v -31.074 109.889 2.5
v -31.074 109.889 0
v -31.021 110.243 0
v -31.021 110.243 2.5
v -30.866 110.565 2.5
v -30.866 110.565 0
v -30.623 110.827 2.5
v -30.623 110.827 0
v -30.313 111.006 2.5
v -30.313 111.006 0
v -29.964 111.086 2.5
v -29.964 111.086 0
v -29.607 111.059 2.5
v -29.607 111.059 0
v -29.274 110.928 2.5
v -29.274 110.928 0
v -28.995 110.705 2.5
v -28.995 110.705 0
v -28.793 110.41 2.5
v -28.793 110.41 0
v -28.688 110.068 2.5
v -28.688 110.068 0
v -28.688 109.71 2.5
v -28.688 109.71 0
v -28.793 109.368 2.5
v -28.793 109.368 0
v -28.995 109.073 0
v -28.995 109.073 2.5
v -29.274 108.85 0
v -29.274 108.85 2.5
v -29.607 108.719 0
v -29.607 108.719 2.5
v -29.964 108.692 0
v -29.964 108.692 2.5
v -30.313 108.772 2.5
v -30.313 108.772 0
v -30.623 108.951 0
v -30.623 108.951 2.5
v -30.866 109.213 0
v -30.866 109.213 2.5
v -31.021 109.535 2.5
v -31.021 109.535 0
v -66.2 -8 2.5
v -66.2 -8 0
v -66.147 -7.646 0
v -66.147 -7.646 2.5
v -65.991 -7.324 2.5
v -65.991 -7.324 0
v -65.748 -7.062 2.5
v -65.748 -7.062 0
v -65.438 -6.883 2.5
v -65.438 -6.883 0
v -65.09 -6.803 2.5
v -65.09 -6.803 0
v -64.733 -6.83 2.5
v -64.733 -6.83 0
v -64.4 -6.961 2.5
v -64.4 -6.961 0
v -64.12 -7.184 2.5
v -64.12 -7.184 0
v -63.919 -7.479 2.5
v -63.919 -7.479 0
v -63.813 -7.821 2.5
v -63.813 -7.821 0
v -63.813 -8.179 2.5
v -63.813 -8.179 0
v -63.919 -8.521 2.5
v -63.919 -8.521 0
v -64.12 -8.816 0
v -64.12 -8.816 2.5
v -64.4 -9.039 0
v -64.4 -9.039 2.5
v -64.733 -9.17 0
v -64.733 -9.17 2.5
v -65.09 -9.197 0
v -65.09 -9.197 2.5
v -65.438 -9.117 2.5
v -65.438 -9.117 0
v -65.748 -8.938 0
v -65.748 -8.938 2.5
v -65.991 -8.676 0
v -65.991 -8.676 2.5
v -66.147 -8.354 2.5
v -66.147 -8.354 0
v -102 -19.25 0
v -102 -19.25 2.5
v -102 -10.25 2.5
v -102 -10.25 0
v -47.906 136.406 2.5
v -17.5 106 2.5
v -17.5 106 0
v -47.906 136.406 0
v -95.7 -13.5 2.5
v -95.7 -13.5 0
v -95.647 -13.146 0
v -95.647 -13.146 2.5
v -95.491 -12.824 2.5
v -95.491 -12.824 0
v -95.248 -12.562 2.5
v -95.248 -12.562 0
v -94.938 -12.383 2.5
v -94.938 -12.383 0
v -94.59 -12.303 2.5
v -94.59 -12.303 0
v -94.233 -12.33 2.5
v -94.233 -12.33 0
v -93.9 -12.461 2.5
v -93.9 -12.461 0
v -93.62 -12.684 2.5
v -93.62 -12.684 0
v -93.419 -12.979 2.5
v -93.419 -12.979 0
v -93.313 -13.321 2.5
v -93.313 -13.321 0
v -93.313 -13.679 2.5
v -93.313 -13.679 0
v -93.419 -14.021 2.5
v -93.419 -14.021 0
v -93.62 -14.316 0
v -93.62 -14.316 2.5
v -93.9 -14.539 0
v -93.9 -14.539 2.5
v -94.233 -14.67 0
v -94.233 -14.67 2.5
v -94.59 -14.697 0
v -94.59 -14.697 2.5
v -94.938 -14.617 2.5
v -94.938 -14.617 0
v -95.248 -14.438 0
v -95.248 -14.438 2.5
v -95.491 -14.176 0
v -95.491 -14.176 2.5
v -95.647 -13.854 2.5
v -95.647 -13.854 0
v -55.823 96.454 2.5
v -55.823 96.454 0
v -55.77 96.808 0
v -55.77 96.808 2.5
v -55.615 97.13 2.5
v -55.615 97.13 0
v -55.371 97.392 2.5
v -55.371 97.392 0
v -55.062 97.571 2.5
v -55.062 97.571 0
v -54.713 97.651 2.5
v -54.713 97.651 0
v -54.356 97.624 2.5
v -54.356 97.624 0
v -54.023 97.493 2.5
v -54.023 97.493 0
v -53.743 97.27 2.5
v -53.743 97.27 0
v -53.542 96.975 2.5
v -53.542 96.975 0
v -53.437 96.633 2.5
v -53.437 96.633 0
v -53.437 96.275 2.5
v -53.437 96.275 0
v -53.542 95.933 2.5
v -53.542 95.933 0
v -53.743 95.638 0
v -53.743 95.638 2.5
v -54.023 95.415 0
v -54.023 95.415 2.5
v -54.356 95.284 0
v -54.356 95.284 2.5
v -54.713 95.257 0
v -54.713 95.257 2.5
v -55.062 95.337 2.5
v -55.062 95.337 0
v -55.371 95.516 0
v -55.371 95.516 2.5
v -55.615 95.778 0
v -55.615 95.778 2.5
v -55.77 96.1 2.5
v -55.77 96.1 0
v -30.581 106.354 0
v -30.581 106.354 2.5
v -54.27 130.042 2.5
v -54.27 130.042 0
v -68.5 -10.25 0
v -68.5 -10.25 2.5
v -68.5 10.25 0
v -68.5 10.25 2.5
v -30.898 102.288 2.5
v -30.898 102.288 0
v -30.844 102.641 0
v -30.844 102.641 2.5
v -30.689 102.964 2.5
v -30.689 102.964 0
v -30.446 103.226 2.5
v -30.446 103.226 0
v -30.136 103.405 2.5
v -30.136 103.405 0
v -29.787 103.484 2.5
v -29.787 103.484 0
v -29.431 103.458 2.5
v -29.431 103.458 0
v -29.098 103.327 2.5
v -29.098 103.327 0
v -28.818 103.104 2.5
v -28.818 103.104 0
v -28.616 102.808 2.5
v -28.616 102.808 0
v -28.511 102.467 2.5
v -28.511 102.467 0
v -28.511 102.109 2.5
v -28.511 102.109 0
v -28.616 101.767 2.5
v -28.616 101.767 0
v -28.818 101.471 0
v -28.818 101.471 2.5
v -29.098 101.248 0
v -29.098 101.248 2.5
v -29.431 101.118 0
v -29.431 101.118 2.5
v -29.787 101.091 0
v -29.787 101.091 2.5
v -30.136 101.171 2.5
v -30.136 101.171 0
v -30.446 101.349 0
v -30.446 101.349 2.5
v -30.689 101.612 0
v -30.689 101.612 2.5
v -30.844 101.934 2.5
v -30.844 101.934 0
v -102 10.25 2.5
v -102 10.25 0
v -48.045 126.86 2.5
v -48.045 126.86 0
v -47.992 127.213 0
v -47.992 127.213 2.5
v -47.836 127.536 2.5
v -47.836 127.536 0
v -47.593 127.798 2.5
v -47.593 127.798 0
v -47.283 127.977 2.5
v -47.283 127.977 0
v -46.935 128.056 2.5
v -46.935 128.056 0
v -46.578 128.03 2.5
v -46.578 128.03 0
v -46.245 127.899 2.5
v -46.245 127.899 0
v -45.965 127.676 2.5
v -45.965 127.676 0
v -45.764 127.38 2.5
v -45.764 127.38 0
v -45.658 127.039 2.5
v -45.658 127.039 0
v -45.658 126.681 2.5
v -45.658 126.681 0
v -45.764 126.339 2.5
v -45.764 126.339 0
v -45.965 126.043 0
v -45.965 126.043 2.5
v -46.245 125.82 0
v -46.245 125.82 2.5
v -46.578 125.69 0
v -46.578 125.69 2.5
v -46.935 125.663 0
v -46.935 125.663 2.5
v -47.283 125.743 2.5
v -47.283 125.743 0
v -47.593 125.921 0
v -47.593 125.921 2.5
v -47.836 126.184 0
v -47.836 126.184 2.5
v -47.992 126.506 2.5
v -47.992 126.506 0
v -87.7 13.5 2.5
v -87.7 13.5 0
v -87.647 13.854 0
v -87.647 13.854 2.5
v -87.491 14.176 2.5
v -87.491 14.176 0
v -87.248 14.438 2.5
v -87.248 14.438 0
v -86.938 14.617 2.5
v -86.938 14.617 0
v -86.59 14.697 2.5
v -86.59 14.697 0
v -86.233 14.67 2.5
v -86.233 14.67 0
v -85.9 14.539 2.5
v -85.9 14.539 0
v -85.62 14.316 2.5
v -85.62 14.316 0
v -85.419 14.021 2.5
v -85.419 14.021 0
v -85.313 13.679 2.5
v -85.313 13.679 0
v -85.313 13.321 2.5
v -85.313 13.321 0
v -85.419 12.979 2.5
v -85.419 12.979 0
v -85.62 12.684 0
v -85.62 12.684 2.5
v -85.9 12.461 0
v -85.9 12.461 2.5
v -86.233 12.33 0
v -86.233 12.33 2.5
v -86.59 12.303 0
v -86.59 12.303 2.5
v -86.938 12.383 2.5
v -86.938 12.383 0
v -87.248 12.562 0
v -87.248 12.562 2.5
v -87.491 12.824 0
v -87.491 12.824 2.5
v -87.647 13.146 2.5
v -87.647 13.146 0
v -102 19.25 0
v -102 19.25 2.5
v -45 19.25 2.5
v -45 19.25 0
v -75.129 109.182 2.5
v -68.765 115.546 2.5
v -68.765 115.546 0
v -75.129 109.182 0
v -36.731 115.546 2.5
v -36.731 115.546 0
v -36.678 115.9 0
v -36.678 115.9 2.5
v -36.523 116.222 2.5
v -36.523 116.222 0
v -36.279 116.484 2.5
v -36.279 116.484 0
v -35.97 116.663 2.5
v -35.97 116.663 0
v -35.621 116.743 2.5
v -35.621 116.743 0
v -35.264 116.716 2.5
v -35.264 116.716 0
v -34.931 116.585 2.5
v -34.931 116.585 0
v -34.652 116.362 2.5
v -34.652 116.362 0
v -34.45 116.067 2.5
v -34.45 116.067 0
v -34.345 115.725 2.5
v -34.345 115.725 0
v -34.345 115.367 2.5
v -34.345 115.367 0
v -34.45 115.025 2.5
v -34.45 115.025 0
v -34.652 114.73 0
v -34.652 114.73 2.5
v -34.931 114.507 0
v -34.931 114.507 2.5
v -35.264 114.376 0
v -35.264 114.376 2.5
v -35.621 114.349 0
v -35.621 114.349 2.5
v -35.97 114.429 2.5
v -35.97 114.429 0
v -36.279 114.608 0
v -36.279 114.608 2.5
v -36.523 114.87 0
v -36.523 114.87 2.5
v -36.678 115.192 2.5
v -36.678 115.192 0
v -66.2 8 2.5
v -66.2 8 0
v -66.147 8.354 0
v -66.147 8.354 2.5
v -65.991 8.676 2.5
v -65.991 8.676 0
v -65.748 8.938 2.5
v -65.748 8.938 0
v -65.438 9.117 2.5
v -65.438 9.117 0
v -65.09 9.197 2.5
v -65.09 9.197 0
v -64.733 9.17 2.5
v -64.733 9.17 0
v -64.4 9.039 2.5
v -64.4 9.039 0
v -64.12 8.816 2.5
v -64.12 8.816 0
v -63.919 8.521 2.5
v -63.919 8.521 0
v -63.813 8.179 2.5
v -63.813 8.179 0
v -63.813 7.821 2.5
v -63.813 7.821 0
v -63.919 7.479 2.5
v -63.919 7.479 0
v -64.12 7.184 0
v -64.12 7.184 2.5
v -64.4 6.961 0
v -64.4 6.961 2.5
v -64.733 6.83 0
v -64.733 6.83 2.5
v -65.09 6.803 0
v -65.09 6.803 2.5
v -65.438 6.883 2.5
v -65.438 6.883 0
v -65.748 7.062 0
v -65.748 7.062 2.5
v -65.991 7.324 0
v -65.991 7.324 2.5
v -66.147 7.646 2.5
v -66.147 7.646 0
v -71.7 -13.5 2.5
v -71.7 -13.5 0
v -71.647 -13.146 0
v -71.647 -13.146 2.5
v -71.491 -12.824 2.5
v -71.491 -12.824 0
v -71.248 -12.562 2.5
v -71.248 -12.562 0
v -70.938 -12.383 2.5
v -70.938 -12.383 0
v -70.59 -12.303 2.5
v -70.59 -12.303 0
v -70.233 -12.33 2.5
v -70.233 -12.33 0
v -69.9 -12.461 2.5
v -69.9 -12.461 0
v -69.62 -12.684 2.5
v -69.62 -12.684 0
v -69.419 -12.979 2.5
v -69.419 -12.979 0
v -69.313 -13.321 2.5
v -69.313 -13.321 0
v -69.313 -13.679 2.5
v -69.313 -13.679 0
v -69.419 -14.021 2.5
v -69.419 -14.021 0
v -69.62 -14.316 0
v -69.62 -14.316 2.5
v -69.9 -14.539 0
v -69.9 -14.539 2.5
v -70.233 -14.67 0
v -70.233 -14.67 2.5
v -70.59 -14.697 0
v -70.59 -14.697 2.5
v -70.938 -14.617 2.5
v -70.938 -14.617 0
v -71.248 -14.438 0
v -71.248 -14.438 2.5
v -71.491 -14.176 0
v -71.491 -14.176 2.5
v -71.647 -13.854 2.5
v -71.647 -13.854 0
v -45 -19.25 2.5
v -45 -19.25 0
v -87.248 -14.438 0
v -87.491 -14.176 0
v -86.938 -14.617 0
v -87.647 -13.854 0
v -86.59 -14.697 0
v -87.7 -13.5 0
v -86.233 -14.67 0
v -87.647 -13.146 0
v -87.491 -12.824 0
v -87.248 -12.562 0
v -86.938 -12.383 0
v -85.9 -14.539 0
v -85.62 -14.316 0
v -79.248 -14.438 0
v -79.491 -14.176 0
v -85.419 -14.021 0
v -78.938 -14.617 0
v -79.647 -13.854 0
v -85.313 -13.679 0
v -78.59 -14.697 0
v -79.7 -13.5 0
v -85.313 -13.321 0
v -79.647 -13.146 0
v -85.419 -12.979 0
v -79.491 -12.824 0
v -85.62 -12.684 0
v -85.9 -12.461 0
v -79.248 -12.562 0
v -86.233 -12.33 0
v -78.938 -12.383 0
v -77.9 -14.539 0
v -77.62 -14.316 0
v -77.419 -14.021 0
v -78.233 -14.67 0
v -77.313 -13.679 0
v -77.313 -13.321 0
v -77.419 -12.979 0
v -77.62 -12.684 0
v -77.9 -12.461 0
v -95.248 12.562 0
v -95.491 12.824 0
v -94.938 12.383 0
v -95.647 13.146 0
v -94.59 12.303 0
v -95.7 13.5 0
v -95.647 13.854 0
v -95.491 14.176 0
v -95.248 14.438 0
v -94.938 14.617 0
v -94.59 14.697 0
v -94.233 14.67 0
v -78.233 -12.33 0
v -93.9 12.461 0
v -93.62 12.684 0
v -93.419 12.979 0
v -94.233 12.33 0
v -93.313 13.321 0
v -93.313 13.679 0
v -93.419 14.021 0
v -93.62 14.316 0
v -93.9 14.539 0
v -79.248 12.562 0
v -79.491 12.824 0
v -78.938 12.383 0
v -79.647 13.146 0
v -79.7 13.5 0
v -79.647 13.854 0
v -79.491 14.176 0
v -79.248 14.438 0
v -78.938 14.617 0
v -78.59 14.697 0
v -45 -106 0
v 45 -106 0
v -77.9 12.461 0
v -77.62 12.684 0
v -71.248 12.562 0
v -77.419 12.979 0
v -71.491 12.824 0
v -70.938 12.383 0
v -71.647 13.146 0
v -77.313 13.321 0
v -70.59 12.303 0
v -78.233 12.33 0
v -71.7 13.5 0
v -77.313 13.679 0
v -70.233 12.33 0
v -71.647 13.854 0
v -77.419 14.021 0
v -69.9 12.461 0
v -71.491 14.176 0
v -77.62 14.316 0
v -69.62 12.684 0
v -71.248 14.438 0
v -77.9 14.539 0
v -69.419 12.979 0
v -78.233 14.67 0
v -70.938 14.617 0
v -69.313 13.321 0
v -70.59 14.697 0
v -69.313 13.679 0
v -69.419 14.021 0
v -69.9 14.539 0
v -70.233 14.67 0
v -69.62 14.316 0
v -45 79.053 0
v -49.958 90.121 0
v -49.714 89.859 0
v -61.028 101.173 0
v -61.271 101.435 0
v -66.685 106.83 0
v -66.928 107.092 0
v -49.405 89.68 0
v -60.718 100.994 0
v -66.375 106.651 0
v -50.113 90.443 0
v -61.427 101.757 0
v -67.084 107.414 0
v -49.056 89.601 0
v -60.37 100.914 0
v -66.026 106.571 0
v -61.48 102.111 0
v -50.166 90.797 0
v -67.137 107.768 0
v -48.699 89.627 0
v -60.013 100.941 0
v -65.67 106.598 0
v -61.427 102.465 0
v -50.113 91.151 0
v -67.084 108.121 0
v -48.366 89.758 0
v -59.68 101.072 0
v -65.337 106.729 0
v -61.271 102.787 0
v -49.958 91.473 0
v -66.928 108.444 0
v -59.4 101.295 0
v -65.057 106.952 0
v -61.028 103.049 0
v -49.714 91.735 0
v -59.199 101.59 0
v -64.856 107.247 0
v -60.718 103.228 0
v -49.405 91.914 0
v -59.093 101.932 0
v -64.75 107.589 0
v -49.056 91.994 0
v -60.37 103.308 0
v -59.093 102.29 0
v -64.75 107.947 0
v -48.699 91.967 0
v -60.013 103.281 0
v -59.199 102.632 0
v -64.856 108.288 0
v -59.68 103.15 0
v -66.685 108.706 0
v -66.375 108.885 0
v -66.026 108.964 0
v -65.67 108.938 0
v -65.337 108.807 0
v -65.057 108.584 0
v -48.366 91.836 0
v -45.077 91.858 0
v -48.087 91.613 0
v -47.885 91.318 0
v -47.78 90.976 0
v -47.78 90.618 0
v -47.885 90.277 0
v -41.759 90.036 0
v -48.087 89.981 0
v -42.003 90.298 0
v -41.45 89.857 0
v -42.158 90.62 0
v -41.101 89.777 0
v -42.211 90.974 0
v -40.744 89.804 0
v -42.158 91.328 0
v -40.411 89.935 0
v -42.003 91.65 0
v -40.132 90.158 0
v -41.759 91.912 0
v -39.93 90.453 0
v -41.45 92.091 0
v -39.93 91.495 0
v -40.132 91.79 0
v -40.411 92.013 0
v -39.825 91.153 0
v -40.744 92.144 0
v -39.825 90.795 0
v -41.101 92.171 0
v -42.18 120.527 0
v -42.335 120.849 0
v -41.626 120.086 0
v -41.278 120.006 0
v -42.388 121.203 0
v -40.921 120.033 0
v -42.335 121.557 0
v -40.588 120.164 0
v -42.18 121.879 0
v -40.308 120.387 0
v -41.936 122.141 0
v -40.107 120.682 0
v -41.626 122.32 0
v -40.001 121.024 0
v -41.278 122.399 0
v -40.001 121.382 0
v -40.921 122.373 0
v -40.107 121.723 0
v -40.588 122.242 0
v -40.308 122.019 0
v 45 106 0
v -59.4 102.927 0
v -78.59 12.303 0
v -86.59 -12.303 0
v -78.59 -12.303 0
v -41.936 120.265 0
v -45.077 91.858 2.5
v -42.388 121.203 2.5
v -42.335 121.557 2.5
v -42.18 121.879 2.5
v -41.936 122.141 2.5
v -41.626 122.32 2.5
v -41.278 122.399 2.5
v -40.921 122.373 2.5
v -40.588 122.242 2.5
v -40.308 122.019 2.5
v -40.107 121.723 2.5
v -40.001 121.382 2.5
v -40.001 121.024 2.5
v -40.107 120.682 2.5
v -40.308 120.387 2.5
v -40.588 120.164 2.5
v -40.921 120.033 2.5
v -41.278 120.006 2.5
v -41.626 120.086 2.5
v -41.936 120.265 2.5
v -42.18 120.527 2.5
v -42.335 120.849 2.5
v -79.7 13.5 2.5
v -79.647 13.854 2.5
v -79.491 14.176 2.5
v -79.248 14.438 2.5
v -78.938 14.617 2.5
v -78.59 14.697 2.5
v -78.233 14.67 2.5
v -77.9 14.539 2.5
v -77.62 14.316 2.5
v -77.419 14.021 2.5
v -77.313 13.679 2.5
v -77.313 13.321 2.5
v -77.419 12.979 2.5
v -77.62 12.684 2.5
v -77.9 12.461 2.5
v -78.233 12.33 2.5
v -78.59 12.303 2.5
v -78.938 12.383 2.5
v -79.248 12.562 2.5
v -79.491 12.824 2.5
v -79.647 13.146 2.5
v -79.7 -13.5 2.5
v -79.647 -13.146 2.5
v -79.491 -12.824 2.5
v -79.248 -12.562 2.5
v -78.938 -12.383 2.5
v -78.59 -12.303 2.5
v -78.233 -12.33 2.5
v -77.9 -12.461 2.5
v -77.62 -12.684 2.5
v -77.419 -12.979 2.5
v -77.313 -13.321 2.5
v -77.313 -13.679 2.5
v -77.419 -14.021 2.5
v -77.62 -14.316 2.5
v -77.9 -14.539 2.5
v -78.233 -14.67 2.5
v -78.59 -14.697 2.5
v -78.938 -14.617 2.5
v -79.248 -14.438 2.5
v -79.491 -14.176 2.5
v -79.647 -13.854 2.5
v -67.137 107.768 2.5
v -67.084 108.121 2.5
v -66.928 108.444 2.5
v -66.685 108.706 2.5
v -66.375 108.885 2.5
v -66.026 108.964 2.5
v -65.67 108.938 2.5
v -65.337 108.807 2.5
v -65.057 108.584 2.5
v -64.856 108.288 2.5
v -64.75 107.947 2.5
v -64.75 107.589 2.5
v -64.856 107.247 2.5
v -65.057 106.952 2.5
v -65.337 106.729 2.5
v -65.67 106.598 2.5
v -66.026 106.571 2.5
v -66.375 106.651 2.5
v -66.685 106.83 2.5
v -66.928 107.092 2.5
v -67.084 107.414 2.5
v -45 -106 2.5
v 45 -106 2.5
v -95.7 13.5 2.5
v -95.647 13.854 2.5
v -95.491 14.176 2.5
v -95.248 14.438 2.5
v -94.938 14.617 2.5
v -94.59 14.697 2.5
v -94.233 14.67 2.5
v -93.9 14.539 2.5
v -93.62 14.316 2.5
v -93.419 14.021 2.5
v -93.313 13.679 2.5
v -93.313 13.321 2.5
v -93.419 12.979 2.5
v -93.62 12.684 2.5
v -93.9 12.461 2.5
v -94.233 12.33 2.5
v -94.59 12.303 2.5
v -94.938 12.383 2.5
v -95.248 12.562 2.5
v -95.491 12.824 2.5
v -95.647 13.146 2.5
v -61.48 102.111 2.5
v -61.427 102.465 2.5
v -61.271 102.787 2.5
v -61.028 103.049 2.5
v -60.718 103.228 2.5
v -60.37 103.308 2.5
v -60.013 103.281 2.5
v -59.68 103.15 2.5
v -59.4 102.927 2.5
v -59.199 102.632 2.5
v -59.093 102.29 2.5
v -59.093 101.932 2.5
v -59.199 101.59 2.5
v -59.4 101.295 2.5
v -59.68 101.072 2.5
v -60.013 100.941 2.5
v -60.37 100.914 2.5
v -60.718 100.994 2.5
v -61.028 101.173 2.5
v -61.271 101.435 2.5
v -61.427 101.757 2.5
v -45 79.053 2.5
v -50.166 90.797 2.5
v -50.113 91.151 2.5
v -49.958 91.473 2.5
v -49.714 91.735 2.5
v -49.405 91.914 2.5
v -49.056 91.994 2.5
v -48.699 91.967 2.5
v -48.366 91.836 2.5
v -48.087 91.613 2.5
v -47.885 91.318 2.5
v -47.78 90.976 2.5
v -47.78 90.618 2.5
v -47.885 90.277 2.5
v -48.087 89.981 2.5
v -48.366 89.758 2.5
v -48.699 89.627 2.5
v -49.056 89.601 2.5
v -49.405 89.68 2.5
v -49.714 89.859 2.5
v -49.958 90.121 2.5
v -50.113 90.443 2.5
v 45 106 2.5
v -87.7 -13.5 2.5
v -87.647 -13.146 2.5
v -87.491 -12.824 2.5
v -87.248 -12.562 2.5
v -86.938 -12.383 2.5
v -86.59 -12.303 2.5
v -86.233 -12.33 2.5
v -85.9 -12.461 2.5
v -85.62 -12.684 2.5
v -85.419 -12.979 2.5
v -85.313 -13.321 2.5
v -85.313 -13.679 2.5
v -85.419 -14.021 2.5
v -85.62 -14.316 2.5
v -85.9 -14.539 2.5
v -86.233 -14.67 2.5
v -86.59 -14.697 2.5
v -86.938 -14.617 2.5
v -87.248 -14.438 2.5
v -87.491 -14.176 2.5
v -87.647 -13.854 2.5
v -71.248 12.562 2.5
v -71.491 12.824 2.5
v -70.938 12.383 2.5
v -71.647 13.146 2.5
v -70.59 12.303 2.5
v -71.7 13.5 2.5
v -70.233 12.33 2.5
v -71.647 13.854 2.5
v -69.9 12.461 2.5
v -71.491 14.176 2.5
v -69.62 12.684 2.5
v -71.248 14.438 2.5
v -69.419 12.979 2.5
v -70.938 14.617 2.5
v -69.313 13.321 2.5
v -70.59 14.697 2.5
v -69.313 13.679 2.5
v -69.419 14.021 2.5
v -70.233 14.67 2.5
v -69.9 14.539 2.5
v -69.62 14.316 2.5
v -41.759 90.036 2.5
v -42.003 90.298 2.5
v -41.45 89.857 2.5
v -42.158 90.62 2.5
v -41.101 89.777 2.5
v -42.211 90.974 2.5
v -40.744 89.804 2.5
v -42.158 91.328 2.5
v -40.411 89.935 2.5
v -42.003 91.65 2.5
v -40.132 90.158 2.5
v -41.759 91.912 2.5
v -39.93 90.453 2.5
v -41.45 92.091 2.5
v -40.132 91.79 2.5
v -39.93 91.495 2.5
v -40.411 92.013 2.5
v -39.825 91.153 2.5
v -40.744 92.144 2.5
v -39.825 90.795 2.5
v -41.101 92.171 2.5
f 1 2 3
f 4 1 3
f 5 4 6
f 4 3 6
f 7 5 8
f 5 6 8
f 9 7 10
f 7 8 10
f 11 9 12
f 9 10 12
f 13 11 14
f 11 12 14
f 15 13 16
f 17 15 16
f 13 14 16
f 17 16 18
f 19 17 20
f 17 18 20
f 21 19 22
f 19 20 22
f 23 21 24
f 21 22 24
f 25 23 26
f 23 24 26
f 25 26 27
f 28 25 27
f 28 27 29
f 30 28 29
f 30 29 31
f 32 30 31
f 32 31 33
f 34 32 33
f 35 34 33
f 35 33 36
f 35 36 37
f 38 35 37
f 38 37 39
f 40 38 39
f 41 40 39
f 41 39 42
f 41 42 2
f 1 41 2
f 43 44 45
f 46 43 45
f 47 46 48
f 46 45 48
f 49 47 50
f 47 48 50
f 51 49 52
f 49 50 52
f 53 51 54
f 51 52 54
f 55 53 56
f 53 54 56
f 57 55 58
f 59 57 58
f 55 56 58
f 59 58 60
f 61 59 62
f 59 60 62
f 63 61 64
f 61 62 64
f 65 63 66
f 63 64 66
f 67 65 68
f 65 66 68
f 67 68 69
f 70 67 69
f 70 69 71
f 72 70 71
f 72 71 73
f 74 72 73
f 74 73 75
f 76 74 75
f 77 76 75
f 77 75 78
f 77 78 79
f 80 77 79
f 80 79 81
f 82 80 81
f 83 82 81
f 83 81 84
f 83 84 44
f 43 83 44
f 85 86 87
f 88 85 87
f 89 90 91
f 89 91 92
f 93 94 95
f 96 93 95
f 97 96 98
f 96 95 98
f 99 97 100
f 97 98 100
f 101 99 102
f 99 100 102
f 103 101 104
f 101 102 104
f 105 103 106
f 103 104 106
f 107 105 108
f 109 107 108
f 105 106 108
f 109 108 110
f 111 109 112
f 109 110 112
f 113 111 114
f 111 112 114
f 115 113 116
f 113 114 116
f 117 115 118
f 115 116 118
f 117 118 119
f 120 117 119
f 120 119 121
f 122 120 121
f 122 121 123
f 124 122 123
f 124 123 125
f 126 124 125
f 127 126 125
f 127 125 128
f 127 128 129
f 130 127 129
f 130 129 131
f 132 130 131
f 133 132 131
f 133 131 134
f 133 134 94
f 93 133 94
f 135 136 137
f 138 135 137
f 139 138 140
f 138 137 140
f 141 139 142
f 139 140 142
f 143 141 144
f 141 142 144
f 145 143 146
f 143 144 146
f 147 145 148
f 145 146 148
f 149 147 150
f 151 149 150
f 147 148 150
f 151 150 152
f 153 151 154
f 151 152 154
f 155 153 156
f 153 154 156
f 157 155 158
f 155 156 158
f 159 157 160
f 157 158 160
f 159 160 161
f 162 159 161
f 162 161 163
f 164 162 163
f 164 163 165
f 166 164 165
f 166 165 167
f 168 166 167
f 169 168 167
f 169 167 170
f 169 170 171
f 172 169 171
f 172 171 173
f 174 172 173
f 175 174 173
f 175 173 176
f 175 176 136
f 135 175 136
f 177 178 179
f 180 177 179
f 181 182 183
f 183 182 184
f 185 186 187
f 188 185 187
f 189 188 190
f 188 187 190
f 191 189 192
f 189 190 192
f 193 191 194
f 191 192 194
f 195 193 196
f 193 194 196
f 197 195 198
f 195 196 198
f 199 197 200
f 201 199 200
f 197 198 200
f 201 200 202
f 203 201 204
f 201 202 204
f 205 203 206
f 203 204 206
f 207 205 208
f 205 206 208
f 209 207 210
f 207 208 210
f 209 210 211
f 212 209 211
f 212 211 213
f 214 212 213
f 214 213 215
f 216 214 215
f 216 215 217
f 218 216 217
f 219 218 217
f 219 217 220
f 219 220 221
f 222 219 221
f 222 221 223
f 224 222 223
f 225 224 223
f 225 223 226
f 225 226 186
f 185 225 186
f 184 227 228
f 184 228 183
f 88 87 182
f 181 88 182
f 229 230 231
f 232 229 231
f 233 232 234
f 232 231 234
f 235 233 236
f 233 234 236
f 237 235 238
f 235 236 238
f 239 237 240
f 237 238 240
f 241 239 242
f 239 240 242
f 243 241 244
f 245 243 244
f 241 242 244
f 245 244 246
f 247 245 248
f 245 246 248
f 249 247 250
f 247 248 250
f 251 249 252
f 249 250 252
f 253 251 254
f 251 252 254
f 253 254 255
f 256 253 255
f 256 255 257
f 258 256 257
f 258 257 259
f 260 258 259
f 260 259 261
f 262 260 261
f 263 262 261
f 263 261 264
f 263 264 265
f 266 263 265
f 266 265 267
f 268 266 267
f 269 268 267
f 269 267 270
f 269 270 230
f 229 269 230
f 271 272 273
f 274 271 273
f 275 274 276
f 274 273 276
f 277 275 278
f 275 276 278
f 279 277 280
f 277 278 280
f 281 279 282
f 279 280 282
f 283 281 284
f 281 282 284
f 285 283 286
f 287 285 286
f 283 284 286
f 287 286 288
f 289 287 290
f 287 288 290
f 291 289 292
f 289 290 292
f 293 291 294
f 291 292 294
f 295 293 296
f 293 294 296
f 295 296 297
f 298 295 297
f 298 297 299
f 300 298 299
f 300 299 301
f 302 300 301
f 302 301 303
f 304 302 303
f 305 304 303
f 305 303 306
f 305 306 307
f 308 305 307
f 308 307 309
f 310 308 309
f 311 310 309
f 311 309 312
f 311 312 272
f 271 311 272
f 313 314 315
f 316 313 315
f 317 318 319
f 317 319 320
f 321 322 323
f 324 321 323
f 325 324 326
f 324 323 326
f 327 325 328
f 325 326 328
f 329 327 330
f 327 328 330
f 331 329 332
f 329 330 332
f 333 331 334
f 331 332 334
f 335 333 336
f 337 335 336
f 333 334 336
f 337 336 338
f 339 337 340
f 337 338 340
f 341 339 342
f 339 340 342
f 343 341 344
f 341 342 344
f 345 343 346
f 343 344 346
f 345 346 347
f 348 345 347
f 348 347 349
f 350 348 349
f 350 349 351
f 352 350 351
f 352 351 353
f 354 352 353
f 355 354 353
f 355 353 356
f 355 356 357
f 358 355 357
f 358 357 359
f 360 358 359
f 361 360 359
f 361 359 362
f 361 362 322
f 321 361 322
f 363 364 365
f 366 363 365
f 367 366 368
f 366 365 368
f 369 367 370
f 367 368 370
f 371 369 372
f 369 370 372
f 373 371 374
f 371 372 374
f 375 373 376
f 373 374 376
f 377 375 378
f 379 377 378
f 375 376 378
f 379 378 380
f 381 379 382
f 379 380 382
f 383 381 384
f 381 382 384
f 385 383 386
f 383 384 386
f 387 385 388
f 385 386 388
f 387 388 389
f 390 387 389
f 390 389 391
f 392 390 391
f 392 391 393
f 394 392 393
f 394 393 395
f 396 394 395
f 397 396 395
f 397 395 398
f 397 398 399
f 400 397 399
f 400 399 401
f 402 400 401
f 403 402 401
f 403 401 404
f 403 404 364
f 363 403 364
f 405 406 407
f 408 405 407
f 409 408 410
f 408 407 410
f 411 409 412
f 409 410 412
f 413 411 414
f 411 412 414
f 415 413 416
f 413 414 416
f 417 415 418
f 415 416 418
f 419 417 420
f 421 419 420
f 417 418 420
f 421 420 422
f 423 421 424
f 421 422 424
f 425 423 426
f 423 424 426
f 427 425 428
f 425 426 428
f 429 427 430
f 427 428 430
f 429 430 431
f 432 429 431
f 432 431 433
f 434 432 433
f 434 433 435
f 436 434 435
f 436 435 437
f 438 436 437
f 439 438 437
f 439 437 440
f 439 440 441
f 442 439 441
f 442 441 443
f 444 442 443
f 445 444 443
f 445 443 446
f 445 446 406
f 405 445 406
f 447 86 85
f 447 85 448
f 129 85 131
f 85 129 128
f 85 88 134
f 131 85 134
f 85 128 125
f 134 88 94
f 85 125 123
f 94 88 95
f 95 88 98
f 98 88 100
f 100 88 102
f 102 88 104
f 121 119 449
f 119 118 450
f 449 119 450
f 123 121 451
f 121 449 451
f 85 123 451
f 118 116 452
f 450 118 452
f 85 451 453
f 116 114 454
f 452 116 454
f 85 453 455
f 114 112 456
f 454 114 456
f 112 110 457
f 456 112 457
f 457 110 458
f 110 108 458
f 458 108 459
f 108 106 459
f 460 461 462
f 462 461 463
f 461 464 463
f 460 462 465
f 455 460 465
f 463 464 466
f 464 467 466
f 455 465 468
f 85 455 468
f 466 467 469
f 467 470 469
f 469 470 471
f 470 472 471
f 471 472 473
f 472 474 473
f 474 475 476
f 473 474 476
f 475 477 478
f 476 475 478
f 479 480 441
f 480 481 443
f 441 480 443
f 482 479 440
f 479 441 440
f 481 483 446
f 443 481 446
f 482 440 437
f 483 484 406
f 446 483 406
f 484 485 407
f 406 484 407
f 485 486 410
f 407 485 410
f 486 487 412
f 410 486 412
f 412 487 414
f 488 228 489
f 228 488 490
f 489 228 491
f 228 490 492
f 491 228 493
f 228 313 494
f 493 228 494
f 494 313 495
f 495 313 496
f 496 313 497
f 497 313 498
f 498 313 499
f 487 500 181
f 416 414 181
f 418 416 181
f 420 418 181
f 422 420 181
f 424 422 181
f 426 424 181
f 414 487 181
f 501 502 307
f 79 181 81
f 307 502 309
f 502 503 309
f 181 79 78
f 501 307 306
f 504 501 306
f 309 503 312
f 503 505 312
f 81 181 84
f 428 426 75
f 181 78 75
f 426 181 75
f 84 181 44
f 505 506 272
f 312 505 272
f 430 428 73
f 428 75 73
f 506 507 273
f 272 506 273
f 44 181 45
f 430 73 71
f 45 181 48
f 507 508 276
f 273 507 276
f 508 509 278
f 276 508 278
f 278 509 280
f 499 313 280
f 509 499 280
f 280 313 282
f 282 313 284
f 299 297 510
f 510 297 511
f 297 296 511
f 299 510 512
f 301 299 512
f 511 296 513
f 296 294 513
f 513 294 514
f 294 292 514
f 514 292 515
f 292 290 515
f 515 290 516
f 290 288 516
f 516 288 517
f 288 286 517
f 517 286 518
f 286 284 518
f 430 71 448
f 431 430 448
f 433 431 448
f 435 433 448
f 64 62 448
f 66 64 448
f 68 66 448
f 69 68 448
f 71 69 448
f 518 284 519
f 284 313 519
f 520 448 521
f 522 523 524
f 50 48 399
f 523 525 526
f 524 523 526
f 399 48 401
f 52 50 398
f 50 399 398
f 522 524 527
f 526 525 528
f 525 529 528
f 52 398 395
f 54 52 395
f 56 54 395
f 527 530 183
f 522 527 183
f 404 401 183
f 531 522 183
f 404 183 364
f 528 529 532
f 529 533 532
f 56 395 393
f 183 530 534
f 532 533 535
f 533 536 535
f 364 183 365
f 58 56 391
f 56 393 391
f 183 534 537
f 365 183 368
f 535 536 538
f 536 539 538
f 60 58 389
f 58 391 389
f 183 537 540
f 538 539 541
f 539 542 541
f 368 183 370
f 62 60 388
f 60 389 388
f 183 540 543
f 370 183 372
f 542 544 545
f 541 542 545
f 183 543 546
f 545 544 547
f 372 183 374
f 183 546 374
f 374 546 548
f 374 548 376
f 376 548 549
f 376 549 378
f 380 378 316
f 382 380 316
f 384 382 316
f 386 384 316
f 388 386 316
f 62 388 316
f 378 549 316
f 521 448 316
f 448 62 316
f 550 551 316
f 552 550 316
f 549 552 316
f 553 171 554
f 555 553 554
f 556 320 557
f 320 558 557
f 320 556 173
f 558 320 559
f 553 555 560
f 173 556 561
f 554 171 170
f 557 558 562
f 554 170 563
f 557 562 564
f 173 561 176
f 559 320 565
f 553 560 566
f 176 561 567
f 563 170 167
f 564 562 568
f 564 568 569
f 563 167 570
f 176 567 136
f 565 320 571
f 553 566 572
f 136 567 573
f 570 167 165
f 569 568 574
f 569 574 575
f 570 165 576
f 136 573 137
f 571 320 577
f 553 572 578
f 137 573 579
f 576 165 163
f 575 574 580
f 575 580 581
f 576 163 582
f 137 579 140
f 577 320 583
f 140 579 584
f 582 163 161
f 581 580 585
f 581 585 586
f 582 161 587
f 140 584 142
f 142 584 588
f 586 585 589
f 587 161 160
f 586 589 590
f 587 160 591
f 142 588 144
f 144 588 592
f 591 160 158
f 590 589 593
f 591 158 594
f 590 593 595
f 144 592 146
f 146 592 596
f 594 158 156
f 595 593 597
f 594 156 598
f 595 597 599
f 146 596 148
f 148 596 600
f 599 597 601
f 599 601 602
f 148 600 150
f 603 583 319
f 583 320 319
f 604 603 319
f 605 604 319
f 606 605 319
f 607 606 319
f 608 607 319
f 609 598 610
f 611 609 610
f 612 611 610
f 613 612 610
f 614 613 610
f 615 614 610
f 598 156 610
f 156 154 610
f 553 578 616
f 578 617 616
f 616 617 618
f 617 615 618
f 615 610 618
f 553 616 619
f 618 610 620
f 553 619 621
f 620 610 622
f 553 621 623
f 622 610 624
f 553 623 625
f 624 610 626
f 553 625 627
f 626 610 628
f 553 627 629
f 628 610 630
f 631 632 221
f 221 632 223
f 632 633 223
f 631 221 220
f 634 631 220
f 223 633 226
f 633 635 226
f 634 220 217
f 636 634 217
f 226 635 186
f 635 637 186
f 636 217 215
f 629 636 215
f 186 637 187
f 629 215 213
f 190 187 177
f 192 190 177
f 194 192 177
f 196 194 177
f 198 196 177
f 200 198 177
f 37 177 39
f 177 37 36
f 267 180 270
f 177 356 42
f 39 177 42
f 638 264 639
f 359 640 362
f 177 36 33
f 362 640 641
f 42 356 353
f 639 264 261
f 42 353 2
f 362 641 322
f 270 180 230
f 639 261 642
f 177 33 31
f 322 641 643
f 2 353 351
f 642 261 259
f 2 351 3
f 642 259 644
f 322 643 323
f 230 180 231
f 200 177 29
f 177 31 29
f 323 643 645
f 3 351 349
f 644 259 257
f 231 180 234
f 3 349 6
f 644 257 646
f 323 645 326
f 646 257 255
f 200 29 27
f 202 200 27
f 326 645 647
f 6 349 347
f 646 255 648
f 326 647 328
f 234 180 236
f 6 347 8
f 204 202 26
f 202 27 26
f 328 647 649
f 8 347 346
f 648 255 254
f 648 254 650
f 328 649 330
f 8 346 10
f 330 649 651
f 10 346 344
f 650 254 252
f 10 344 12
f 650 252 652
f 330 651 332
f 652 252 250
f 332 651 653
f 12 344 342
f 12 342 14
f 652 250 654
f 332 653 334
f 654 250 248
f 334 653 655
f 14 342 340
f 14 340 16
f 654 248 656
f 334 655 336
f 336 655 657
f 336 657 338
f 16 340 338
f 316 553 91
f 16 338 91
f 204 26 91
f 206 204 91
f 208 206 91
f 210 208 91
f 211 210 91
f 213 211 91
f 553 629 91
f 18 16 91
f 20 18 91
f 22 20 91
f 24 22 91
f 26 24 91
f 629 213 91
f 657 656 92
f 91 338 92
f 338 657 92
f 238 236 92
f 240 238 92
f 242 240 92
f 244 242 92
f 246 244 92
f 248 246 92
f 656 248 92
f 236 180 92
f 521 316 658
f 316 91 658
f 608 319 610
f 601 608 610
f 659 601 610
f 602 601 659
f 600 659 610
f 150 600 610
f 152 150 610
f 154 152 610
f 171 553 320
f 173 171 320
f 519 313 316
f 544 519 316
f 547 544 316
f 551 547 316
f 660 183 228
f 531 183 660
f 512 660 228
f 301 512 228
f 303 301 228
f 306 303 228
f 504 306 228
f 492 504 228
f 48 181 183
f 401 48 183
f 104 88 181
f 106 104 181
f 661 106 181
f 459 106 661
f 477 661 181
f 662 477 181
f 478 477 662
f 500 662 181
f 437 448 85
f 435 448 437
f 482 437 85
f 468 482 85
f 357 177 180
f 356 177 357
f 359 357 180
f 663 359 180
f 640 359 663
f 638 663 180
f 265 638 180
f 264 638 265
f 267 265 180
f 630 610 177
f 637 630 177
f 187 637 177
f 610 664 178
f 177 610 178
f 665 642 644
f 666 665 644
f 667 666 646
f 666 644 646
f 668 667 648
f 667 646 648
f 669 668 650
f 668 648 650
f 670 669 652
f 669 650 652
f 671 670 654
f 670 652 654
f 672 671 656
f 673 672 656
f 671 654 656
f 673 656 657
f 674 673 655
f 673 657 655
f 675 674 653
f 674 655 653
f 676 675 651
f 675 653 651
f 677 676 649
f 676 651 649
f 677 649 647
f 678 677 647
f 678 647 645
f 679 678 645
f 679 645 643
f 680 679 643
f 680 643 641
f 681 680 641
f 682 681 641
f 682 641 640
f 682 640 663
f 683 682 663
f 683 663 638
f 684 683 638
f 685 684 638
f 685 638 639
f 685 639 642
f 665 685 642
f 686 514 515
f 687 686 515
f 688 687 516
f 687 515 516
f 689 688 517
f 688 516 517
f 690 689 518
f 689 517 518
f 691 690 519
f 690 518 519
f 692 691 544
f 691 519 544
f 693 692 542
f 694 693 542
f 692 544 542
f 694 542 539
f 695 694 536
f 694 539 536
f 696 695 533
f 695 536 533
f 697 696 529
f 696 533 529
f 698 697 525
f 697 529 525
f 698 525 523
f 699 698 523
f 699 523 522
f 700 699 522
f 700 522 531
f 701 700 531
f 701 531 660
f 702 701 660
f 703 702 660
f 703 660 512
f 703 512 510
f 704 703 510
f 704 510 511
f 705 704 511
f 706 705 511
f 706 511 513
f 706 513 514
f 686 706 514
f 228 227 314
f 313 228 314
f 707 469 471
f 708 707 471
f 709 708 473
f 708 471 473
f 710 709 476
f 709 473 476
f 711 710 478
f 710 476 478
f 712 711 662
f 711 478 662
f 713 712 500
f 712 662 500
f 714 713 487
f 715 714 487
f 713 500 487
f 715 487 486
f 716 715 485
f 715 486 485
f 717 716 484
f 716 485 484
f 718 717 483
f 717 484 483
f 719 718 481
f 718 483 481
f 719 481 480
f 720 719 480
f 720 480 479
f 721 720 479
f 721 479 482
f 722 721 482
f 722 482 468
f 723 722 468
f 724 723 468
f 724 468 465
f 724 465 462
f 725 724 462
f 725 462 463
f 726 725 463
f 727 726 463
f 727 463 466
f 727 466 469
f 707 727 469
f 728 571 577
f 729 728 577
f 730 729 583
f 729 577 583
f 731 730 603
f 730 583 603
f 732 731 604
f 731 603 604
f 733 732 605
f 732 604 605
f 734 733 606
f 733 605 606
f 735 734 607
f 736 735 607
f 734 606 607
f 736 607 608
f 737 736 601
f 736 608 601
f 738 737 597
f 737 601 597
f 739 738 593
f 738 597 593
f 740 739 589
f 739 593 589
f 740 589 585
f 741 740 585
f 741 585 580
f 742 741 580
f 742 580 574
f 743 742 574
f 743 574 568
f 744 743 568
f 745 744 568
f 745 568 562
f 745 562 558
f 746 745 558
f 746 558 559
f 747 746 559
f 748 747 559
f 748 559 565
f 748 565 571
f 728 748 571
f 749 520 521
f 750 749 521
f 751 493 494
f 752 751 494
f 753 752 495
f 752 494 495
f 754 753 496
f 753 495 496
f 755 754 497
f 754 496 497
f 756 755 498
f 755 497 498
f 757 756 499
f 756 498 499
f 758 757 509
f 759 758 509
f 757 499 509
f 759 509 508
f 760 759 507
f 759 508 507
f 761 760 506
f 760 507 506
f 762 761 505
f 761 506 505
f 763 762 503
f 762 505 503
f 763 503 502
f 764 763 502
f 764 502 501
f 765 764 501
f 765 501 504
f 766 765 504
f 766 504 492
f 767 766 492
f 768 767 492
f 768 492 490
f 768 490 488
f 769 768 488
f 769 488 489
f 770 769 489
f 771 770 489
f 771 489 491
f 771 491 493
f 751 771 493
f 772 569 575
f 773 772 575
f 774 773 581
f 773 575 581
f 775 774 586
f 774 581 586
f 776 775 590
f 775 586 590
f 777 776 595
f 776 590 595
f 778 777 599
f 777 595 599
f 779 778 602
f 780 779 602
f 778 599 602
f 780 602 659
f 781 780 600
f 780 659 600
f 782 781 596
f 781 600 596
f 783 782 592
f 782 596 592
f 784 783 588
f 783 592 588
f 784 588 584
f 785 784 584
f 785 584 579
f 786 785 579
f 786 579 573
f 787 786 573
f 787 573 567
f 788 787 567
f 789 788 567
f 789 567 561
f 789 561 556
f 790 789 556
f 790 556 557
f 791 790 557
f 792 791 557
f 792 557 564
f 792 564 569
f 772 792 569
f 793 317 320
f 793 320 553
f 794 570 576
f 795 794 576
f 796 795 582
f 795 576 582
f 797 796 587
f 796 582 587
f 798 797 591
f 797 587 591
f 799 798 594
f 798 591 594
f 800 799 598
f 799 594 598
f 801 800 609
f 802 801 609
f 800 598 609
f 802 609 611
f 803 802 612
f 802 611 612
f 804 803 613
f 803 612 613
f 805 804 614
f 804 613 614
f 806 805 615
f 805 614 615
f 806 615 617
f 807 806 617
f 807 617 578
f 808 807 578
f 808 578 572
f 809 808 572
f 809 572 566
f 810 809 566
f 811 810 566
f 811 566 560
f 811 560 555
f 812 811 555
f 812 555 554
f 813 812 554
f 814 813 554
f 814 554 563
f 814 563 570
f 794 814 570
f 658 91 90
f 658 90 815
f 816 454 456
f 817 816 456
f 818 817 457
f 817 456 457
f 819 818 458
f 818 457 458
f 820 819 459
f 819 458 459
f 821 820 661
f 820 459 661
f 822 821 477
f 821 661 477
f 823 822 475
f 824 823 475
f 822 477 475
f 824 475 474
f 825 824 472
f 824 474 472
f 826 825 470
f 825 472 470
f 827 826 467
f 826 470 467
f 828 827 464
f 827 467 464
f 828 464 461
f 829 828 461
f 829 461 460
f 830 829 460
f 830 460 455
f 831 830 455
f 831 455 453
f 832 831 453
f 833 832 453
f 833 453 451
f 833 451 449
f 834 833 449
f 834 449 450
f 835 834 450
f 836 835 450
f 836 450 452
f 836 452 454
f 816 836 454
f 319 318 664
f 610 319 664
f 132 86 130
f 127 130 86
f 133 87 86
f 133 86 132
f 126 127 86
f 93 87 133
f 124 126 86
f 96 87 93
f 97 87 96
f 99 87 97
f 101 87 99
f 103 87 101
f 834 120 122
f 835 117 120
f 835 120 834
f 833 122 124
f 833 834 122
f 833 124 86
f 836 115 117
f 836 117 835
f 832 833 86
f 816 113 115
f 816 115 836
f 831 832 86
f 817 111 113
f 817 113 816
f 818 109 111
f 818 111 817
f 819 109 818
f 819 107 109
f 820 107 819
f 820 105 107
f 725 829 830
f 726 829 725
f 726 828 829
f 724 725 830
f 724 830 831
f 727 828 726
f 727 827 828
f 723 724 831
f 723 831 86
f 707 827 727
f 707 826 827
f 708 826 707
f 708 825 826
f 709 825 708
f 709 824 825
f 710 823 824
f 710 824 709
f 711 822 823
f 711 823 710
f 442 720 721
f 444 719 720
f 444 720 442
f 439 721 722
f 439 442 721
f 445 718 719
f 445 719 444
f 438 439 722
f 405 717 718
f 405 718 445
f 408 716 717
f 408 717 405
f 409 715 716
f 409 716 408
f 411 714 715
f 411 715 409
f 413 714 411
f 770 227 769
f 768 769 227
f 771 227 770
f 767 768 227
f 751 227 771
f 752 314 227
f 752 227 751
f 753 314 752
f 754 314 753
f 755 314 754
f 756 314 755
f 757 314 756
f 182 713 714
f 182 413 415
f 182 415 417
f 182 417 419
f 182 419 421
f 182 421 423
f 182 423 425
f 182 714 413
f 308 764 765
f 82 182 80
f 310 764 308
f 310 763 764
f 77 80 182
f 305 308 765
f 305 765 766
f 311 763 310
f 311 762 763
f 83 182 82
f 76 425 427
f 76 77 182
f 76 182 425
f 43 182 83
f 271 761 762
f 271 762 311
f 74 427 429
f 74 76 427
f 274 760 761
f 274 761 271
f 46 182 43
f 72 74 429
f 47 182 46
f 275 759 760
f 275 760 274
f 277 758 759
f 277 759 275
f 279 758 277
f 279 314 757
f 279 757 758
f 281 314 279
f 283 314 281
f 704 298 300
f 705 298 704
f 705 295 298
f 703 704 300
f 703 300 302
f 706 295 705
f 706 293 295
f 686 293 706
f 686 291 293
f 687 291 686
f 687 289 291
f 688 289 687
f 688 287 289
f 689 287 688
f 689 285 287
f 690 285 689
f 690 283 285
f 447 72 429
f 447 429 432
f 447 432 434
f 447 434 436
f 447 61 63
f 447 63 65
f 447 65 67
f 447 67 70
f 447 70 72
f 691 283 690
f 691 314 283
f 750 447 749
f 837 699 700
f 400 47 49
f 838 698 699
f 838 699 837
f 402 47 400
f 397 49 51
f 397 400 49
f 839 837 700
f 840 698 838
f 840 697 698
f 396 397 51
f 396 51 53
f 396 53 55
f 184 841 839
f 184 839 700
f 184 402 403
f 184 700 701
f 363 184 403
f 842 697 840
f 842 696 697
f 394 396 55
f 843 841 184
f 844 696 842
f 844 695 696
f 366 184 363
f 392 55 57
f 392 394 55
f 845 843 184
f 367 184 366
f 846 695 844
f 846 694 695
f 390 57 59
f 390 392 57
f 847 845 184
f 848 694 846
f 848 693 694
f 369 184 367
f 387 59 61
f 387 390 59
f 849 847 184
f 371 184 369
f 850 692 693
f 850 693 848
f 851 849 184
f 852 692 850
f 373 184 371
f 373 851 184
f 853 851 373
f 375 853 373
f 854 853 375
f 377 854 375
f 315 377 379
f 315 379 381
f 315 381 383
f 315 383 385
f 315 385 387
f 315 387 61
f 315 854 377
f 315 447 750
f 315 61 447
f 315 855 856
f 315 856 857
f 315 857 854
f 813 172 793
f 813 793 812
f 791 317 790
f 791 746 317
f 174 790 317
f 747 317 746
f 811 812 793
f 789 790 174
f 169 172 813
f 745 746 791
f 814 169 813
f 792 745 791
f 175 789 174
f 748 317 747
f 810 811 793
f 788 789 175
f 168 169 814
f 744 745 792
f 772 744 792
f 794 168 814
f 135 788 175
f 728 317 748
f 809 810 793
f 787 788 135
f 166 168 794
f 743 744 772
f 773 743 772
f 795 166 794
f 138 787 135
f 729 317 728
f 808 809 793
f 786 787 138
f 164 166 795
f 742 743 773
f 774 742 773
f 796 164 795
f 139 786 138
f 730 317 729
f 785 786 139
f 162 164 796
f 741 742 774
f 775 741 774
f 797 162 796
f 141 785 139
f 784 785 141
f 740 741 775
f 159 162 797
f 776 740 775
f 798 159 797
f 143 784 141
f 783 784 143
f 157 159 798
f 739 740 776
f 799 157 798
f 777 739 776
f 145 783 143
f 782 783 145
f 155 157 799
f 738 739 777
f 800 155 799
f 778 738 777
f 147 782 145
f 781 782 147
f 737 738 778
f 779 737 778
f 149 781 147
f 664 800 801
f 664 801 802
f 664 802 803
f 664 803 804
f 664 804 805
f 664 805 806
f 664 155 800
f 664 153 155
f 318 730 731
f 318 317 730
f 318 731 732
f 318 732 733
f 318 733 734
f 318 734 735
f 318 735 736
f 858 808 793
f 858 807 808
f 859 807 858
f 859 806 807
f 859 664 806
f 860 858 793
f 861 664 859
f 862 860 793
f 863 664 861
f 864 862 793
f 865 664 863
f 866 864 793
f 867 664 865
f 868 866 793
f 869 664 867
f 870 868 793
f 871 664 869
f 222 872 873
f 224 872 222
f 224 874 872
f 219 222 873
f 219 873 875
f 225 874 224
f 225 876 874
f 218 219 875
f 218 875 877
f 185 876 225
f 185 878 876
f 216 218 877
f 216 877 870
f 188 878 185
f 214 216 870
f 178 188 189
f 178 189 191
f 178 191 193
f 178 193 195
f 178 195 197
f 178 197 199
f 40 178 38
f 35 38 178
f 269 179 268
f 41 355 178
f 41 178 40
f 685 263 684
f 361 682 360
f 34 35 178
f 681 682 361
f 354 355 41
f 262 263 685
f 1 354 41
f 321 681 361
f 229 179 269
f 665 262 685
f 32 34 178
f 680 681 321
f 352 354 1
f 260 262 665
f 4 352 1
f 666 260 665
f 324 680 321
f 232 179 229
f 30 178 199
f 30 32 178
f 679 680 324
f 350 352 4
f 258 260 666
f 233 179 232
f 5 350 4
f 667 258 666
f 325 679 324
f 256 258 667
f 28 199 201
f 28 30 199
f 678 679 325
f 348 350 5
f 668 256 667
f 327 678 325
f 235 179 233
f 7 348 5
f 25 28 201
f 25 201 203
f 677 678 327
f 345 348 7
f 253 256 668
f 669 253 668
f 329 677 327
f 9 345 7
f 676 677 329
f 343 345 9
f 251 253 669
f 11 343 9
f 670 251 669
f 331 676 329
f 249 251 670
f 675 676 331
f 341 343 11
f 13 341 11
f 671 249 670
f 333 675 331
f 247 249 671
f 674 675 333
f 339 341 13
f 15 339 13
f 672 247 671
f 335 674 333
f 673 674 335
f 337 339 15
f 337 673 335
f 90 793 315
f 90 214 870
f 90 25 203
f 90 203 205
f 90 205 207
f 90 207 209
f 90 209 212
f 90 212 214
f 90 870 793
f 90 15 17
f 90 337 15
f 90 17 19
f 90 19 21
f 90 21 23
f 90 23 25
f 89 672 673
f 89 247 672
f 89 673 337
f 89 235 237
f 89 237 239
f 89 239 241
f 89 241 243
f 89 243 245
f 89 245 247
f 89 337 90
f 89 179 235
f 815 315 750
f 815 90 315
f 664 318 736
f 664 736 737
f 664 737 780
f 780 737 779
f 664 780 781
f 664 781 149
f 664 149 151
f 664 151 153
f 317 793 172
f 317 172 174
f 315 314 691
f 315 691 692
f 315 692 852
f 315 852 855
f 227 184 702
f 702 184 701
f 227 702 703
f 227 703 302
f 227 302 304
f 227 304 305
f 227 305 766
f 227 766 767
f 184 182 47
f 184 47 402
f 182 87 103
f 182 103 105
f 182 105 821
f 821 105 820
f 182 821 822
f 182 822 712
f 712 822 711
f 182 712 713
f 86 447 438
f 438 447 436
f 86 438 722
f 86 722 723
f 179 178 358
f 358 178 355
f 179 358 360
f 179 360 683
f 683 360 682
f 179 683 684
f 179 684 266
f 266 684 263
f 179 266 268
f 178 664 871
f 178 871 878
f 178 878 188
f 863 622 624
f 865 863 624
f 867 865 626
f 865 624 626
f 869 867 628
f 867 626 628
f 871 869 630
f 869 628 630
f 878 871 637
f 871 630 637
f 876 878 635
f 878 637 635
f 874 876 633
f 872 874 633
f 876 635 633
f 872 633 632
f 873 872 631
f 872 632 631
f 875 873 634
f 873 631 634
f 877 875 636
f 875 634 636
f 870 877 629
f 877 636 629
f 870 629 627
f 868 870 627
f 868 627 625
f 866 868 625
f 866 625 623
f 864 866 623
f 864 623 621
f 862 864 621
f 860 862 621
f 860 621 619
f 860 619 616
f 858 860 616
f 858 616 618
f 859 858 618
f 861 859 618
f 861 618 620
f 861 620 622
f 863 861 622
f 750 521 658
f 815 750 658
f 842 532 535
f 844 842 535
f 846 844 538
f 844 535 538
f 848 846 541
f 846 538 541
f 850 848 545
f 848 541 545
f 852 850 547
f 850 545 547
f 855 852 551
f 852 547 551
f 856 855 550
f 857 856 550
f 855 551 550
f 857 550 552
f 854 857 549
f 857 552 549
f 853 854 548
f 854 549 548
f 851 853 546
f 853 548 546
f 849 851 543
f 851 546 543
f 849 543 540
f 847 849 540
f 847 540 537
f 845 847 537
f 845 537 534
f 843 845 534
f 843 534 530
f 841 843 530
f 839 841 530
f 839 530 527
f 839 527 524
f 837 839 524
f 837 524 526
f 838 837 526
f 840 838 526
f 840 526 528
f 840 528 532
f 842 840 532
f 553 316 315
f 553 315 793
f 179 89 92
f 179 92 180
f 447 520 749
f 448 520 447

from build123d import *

# Parameters (mm, degrees)
ESQUISSE1_W             = 90
ESQUISSE1_H             = 212
BOSS_EXTRU_1_DEPTH      = 2.5
ESQUISSE2_W             = 57
ESQUISSE2_H             = 38.5
BOSS_EXTRU_2_DEPTH      = 2.5
ENL_V_MAT_EXTRU_1_REACH = 172.343
ESQUISSE3_W             = 33.5
ESQUISSE3_H             = 20.5
D_GAGEMENT_M21_D        = 2.4


with BuildPart() as part:
    # Esquisse1 → Boss.-Extru.1 (new body)
    with BuildSketch(Plane.XY):
        Rectangle(ESQUISSE1_W, ESQUISSE1_H)
    extrude(amount=BOSS_EXTRU_1_DEPTH)

    # Esquisse2 → Boss.-Extru.2 (add)
    with BuildSketch(Plane.XY.offset(2.5)):
        Polygon((-75.129202667, 109.181980515), (-45, 79.052777849), (-45, 106), (-17.5, 106), (-47.905591591, 136.405591591), align=None)
        with Locations((-73.5, 0)):
            Rectangle(ESQUISSE2_W, ESQUISSE2_H)
    extrude(amount=-BOSS_EXTRU_2_DEPTH)

    # Esquisse3 → Enlèv. mat.-Extru.1 (cut, up to next)
    with BuildSketch(Plane.XY.offset(2.5), mode=Mode.PRIVATE) as enl_v_mat_extru_1_sk1:
        Polygon((-54.269552622, 130.04163056), (-68.765241636, 115.545941546), (-45.077164466, 91.857864376), (-30.581475452, 106.353553391), align=None)
    enl_v_mat_extru_1_tool1 = extrude(enl_v_mat_extru_1_sk1.sketch, amount=-ENL_V_MAT_EXTRU_1_REACH, mode=Mode.PRIVATE) & part.part
    # Esquisse3 → Enlèv. mat.-Extru.1 (cut, up to next)
    with BuildSketch(Plane.XY.offset(2.5), mode=Mode.PRIVATE) as enl_v_mat_extru_1_sk2:
        with Locations((-85.25, 0)):
            Rectangle(ESQUISSE3_W, ESQUISSE3_H)
    enl_v_mat_extru_1_tool2 = extrude(enl_v_mat_extru_1_sk2.sketch, amount=-ENL_V_MAT_EXTRU_1_REACH, mode=Mode.PRIVATE) & part.part
    add(enl_v_mat_extru_1_tool1.solids().sort_by_distance((-49.673359, 110.949747, 2.5))[0], mode=Mode.SUBTRACT)
    add(enl_v_mat_extru_1_tool2.solids().sort_by_distance((-85.25, 0, 2.5))[0], mode=Mode.SUBTRACT)

    # Dégagement M21 (through all)
    with Locations(Plane.XY.offset(2.5)):
        with Locations((-94.5, -13.5), (-86.5, -13.5), (-78.5, -13.5), (-70.5, -13.5), (-65, -8), (-65, 8), (-70.5, 13.5), (-78.5, 13.5), (-86.5, 13.5), (-94.5, 13.5), (-41.011300474, 90.9739809), (-29.697591975, 102.287689399), (-29.874368671, 109.889087297), (-35.53122292, 115.545941546), (-41.18807717, 121.202795796), (-46.844931419, 126.859650045), (-65.936814511, 107.767766953), (-60.279960262, 102.110912703), (-54.623106012, 96.454058454), (-48.966251763, 90.797204204)):
            Hole(D_GAGEMENT_M21_D / 2)


solid = part.part
